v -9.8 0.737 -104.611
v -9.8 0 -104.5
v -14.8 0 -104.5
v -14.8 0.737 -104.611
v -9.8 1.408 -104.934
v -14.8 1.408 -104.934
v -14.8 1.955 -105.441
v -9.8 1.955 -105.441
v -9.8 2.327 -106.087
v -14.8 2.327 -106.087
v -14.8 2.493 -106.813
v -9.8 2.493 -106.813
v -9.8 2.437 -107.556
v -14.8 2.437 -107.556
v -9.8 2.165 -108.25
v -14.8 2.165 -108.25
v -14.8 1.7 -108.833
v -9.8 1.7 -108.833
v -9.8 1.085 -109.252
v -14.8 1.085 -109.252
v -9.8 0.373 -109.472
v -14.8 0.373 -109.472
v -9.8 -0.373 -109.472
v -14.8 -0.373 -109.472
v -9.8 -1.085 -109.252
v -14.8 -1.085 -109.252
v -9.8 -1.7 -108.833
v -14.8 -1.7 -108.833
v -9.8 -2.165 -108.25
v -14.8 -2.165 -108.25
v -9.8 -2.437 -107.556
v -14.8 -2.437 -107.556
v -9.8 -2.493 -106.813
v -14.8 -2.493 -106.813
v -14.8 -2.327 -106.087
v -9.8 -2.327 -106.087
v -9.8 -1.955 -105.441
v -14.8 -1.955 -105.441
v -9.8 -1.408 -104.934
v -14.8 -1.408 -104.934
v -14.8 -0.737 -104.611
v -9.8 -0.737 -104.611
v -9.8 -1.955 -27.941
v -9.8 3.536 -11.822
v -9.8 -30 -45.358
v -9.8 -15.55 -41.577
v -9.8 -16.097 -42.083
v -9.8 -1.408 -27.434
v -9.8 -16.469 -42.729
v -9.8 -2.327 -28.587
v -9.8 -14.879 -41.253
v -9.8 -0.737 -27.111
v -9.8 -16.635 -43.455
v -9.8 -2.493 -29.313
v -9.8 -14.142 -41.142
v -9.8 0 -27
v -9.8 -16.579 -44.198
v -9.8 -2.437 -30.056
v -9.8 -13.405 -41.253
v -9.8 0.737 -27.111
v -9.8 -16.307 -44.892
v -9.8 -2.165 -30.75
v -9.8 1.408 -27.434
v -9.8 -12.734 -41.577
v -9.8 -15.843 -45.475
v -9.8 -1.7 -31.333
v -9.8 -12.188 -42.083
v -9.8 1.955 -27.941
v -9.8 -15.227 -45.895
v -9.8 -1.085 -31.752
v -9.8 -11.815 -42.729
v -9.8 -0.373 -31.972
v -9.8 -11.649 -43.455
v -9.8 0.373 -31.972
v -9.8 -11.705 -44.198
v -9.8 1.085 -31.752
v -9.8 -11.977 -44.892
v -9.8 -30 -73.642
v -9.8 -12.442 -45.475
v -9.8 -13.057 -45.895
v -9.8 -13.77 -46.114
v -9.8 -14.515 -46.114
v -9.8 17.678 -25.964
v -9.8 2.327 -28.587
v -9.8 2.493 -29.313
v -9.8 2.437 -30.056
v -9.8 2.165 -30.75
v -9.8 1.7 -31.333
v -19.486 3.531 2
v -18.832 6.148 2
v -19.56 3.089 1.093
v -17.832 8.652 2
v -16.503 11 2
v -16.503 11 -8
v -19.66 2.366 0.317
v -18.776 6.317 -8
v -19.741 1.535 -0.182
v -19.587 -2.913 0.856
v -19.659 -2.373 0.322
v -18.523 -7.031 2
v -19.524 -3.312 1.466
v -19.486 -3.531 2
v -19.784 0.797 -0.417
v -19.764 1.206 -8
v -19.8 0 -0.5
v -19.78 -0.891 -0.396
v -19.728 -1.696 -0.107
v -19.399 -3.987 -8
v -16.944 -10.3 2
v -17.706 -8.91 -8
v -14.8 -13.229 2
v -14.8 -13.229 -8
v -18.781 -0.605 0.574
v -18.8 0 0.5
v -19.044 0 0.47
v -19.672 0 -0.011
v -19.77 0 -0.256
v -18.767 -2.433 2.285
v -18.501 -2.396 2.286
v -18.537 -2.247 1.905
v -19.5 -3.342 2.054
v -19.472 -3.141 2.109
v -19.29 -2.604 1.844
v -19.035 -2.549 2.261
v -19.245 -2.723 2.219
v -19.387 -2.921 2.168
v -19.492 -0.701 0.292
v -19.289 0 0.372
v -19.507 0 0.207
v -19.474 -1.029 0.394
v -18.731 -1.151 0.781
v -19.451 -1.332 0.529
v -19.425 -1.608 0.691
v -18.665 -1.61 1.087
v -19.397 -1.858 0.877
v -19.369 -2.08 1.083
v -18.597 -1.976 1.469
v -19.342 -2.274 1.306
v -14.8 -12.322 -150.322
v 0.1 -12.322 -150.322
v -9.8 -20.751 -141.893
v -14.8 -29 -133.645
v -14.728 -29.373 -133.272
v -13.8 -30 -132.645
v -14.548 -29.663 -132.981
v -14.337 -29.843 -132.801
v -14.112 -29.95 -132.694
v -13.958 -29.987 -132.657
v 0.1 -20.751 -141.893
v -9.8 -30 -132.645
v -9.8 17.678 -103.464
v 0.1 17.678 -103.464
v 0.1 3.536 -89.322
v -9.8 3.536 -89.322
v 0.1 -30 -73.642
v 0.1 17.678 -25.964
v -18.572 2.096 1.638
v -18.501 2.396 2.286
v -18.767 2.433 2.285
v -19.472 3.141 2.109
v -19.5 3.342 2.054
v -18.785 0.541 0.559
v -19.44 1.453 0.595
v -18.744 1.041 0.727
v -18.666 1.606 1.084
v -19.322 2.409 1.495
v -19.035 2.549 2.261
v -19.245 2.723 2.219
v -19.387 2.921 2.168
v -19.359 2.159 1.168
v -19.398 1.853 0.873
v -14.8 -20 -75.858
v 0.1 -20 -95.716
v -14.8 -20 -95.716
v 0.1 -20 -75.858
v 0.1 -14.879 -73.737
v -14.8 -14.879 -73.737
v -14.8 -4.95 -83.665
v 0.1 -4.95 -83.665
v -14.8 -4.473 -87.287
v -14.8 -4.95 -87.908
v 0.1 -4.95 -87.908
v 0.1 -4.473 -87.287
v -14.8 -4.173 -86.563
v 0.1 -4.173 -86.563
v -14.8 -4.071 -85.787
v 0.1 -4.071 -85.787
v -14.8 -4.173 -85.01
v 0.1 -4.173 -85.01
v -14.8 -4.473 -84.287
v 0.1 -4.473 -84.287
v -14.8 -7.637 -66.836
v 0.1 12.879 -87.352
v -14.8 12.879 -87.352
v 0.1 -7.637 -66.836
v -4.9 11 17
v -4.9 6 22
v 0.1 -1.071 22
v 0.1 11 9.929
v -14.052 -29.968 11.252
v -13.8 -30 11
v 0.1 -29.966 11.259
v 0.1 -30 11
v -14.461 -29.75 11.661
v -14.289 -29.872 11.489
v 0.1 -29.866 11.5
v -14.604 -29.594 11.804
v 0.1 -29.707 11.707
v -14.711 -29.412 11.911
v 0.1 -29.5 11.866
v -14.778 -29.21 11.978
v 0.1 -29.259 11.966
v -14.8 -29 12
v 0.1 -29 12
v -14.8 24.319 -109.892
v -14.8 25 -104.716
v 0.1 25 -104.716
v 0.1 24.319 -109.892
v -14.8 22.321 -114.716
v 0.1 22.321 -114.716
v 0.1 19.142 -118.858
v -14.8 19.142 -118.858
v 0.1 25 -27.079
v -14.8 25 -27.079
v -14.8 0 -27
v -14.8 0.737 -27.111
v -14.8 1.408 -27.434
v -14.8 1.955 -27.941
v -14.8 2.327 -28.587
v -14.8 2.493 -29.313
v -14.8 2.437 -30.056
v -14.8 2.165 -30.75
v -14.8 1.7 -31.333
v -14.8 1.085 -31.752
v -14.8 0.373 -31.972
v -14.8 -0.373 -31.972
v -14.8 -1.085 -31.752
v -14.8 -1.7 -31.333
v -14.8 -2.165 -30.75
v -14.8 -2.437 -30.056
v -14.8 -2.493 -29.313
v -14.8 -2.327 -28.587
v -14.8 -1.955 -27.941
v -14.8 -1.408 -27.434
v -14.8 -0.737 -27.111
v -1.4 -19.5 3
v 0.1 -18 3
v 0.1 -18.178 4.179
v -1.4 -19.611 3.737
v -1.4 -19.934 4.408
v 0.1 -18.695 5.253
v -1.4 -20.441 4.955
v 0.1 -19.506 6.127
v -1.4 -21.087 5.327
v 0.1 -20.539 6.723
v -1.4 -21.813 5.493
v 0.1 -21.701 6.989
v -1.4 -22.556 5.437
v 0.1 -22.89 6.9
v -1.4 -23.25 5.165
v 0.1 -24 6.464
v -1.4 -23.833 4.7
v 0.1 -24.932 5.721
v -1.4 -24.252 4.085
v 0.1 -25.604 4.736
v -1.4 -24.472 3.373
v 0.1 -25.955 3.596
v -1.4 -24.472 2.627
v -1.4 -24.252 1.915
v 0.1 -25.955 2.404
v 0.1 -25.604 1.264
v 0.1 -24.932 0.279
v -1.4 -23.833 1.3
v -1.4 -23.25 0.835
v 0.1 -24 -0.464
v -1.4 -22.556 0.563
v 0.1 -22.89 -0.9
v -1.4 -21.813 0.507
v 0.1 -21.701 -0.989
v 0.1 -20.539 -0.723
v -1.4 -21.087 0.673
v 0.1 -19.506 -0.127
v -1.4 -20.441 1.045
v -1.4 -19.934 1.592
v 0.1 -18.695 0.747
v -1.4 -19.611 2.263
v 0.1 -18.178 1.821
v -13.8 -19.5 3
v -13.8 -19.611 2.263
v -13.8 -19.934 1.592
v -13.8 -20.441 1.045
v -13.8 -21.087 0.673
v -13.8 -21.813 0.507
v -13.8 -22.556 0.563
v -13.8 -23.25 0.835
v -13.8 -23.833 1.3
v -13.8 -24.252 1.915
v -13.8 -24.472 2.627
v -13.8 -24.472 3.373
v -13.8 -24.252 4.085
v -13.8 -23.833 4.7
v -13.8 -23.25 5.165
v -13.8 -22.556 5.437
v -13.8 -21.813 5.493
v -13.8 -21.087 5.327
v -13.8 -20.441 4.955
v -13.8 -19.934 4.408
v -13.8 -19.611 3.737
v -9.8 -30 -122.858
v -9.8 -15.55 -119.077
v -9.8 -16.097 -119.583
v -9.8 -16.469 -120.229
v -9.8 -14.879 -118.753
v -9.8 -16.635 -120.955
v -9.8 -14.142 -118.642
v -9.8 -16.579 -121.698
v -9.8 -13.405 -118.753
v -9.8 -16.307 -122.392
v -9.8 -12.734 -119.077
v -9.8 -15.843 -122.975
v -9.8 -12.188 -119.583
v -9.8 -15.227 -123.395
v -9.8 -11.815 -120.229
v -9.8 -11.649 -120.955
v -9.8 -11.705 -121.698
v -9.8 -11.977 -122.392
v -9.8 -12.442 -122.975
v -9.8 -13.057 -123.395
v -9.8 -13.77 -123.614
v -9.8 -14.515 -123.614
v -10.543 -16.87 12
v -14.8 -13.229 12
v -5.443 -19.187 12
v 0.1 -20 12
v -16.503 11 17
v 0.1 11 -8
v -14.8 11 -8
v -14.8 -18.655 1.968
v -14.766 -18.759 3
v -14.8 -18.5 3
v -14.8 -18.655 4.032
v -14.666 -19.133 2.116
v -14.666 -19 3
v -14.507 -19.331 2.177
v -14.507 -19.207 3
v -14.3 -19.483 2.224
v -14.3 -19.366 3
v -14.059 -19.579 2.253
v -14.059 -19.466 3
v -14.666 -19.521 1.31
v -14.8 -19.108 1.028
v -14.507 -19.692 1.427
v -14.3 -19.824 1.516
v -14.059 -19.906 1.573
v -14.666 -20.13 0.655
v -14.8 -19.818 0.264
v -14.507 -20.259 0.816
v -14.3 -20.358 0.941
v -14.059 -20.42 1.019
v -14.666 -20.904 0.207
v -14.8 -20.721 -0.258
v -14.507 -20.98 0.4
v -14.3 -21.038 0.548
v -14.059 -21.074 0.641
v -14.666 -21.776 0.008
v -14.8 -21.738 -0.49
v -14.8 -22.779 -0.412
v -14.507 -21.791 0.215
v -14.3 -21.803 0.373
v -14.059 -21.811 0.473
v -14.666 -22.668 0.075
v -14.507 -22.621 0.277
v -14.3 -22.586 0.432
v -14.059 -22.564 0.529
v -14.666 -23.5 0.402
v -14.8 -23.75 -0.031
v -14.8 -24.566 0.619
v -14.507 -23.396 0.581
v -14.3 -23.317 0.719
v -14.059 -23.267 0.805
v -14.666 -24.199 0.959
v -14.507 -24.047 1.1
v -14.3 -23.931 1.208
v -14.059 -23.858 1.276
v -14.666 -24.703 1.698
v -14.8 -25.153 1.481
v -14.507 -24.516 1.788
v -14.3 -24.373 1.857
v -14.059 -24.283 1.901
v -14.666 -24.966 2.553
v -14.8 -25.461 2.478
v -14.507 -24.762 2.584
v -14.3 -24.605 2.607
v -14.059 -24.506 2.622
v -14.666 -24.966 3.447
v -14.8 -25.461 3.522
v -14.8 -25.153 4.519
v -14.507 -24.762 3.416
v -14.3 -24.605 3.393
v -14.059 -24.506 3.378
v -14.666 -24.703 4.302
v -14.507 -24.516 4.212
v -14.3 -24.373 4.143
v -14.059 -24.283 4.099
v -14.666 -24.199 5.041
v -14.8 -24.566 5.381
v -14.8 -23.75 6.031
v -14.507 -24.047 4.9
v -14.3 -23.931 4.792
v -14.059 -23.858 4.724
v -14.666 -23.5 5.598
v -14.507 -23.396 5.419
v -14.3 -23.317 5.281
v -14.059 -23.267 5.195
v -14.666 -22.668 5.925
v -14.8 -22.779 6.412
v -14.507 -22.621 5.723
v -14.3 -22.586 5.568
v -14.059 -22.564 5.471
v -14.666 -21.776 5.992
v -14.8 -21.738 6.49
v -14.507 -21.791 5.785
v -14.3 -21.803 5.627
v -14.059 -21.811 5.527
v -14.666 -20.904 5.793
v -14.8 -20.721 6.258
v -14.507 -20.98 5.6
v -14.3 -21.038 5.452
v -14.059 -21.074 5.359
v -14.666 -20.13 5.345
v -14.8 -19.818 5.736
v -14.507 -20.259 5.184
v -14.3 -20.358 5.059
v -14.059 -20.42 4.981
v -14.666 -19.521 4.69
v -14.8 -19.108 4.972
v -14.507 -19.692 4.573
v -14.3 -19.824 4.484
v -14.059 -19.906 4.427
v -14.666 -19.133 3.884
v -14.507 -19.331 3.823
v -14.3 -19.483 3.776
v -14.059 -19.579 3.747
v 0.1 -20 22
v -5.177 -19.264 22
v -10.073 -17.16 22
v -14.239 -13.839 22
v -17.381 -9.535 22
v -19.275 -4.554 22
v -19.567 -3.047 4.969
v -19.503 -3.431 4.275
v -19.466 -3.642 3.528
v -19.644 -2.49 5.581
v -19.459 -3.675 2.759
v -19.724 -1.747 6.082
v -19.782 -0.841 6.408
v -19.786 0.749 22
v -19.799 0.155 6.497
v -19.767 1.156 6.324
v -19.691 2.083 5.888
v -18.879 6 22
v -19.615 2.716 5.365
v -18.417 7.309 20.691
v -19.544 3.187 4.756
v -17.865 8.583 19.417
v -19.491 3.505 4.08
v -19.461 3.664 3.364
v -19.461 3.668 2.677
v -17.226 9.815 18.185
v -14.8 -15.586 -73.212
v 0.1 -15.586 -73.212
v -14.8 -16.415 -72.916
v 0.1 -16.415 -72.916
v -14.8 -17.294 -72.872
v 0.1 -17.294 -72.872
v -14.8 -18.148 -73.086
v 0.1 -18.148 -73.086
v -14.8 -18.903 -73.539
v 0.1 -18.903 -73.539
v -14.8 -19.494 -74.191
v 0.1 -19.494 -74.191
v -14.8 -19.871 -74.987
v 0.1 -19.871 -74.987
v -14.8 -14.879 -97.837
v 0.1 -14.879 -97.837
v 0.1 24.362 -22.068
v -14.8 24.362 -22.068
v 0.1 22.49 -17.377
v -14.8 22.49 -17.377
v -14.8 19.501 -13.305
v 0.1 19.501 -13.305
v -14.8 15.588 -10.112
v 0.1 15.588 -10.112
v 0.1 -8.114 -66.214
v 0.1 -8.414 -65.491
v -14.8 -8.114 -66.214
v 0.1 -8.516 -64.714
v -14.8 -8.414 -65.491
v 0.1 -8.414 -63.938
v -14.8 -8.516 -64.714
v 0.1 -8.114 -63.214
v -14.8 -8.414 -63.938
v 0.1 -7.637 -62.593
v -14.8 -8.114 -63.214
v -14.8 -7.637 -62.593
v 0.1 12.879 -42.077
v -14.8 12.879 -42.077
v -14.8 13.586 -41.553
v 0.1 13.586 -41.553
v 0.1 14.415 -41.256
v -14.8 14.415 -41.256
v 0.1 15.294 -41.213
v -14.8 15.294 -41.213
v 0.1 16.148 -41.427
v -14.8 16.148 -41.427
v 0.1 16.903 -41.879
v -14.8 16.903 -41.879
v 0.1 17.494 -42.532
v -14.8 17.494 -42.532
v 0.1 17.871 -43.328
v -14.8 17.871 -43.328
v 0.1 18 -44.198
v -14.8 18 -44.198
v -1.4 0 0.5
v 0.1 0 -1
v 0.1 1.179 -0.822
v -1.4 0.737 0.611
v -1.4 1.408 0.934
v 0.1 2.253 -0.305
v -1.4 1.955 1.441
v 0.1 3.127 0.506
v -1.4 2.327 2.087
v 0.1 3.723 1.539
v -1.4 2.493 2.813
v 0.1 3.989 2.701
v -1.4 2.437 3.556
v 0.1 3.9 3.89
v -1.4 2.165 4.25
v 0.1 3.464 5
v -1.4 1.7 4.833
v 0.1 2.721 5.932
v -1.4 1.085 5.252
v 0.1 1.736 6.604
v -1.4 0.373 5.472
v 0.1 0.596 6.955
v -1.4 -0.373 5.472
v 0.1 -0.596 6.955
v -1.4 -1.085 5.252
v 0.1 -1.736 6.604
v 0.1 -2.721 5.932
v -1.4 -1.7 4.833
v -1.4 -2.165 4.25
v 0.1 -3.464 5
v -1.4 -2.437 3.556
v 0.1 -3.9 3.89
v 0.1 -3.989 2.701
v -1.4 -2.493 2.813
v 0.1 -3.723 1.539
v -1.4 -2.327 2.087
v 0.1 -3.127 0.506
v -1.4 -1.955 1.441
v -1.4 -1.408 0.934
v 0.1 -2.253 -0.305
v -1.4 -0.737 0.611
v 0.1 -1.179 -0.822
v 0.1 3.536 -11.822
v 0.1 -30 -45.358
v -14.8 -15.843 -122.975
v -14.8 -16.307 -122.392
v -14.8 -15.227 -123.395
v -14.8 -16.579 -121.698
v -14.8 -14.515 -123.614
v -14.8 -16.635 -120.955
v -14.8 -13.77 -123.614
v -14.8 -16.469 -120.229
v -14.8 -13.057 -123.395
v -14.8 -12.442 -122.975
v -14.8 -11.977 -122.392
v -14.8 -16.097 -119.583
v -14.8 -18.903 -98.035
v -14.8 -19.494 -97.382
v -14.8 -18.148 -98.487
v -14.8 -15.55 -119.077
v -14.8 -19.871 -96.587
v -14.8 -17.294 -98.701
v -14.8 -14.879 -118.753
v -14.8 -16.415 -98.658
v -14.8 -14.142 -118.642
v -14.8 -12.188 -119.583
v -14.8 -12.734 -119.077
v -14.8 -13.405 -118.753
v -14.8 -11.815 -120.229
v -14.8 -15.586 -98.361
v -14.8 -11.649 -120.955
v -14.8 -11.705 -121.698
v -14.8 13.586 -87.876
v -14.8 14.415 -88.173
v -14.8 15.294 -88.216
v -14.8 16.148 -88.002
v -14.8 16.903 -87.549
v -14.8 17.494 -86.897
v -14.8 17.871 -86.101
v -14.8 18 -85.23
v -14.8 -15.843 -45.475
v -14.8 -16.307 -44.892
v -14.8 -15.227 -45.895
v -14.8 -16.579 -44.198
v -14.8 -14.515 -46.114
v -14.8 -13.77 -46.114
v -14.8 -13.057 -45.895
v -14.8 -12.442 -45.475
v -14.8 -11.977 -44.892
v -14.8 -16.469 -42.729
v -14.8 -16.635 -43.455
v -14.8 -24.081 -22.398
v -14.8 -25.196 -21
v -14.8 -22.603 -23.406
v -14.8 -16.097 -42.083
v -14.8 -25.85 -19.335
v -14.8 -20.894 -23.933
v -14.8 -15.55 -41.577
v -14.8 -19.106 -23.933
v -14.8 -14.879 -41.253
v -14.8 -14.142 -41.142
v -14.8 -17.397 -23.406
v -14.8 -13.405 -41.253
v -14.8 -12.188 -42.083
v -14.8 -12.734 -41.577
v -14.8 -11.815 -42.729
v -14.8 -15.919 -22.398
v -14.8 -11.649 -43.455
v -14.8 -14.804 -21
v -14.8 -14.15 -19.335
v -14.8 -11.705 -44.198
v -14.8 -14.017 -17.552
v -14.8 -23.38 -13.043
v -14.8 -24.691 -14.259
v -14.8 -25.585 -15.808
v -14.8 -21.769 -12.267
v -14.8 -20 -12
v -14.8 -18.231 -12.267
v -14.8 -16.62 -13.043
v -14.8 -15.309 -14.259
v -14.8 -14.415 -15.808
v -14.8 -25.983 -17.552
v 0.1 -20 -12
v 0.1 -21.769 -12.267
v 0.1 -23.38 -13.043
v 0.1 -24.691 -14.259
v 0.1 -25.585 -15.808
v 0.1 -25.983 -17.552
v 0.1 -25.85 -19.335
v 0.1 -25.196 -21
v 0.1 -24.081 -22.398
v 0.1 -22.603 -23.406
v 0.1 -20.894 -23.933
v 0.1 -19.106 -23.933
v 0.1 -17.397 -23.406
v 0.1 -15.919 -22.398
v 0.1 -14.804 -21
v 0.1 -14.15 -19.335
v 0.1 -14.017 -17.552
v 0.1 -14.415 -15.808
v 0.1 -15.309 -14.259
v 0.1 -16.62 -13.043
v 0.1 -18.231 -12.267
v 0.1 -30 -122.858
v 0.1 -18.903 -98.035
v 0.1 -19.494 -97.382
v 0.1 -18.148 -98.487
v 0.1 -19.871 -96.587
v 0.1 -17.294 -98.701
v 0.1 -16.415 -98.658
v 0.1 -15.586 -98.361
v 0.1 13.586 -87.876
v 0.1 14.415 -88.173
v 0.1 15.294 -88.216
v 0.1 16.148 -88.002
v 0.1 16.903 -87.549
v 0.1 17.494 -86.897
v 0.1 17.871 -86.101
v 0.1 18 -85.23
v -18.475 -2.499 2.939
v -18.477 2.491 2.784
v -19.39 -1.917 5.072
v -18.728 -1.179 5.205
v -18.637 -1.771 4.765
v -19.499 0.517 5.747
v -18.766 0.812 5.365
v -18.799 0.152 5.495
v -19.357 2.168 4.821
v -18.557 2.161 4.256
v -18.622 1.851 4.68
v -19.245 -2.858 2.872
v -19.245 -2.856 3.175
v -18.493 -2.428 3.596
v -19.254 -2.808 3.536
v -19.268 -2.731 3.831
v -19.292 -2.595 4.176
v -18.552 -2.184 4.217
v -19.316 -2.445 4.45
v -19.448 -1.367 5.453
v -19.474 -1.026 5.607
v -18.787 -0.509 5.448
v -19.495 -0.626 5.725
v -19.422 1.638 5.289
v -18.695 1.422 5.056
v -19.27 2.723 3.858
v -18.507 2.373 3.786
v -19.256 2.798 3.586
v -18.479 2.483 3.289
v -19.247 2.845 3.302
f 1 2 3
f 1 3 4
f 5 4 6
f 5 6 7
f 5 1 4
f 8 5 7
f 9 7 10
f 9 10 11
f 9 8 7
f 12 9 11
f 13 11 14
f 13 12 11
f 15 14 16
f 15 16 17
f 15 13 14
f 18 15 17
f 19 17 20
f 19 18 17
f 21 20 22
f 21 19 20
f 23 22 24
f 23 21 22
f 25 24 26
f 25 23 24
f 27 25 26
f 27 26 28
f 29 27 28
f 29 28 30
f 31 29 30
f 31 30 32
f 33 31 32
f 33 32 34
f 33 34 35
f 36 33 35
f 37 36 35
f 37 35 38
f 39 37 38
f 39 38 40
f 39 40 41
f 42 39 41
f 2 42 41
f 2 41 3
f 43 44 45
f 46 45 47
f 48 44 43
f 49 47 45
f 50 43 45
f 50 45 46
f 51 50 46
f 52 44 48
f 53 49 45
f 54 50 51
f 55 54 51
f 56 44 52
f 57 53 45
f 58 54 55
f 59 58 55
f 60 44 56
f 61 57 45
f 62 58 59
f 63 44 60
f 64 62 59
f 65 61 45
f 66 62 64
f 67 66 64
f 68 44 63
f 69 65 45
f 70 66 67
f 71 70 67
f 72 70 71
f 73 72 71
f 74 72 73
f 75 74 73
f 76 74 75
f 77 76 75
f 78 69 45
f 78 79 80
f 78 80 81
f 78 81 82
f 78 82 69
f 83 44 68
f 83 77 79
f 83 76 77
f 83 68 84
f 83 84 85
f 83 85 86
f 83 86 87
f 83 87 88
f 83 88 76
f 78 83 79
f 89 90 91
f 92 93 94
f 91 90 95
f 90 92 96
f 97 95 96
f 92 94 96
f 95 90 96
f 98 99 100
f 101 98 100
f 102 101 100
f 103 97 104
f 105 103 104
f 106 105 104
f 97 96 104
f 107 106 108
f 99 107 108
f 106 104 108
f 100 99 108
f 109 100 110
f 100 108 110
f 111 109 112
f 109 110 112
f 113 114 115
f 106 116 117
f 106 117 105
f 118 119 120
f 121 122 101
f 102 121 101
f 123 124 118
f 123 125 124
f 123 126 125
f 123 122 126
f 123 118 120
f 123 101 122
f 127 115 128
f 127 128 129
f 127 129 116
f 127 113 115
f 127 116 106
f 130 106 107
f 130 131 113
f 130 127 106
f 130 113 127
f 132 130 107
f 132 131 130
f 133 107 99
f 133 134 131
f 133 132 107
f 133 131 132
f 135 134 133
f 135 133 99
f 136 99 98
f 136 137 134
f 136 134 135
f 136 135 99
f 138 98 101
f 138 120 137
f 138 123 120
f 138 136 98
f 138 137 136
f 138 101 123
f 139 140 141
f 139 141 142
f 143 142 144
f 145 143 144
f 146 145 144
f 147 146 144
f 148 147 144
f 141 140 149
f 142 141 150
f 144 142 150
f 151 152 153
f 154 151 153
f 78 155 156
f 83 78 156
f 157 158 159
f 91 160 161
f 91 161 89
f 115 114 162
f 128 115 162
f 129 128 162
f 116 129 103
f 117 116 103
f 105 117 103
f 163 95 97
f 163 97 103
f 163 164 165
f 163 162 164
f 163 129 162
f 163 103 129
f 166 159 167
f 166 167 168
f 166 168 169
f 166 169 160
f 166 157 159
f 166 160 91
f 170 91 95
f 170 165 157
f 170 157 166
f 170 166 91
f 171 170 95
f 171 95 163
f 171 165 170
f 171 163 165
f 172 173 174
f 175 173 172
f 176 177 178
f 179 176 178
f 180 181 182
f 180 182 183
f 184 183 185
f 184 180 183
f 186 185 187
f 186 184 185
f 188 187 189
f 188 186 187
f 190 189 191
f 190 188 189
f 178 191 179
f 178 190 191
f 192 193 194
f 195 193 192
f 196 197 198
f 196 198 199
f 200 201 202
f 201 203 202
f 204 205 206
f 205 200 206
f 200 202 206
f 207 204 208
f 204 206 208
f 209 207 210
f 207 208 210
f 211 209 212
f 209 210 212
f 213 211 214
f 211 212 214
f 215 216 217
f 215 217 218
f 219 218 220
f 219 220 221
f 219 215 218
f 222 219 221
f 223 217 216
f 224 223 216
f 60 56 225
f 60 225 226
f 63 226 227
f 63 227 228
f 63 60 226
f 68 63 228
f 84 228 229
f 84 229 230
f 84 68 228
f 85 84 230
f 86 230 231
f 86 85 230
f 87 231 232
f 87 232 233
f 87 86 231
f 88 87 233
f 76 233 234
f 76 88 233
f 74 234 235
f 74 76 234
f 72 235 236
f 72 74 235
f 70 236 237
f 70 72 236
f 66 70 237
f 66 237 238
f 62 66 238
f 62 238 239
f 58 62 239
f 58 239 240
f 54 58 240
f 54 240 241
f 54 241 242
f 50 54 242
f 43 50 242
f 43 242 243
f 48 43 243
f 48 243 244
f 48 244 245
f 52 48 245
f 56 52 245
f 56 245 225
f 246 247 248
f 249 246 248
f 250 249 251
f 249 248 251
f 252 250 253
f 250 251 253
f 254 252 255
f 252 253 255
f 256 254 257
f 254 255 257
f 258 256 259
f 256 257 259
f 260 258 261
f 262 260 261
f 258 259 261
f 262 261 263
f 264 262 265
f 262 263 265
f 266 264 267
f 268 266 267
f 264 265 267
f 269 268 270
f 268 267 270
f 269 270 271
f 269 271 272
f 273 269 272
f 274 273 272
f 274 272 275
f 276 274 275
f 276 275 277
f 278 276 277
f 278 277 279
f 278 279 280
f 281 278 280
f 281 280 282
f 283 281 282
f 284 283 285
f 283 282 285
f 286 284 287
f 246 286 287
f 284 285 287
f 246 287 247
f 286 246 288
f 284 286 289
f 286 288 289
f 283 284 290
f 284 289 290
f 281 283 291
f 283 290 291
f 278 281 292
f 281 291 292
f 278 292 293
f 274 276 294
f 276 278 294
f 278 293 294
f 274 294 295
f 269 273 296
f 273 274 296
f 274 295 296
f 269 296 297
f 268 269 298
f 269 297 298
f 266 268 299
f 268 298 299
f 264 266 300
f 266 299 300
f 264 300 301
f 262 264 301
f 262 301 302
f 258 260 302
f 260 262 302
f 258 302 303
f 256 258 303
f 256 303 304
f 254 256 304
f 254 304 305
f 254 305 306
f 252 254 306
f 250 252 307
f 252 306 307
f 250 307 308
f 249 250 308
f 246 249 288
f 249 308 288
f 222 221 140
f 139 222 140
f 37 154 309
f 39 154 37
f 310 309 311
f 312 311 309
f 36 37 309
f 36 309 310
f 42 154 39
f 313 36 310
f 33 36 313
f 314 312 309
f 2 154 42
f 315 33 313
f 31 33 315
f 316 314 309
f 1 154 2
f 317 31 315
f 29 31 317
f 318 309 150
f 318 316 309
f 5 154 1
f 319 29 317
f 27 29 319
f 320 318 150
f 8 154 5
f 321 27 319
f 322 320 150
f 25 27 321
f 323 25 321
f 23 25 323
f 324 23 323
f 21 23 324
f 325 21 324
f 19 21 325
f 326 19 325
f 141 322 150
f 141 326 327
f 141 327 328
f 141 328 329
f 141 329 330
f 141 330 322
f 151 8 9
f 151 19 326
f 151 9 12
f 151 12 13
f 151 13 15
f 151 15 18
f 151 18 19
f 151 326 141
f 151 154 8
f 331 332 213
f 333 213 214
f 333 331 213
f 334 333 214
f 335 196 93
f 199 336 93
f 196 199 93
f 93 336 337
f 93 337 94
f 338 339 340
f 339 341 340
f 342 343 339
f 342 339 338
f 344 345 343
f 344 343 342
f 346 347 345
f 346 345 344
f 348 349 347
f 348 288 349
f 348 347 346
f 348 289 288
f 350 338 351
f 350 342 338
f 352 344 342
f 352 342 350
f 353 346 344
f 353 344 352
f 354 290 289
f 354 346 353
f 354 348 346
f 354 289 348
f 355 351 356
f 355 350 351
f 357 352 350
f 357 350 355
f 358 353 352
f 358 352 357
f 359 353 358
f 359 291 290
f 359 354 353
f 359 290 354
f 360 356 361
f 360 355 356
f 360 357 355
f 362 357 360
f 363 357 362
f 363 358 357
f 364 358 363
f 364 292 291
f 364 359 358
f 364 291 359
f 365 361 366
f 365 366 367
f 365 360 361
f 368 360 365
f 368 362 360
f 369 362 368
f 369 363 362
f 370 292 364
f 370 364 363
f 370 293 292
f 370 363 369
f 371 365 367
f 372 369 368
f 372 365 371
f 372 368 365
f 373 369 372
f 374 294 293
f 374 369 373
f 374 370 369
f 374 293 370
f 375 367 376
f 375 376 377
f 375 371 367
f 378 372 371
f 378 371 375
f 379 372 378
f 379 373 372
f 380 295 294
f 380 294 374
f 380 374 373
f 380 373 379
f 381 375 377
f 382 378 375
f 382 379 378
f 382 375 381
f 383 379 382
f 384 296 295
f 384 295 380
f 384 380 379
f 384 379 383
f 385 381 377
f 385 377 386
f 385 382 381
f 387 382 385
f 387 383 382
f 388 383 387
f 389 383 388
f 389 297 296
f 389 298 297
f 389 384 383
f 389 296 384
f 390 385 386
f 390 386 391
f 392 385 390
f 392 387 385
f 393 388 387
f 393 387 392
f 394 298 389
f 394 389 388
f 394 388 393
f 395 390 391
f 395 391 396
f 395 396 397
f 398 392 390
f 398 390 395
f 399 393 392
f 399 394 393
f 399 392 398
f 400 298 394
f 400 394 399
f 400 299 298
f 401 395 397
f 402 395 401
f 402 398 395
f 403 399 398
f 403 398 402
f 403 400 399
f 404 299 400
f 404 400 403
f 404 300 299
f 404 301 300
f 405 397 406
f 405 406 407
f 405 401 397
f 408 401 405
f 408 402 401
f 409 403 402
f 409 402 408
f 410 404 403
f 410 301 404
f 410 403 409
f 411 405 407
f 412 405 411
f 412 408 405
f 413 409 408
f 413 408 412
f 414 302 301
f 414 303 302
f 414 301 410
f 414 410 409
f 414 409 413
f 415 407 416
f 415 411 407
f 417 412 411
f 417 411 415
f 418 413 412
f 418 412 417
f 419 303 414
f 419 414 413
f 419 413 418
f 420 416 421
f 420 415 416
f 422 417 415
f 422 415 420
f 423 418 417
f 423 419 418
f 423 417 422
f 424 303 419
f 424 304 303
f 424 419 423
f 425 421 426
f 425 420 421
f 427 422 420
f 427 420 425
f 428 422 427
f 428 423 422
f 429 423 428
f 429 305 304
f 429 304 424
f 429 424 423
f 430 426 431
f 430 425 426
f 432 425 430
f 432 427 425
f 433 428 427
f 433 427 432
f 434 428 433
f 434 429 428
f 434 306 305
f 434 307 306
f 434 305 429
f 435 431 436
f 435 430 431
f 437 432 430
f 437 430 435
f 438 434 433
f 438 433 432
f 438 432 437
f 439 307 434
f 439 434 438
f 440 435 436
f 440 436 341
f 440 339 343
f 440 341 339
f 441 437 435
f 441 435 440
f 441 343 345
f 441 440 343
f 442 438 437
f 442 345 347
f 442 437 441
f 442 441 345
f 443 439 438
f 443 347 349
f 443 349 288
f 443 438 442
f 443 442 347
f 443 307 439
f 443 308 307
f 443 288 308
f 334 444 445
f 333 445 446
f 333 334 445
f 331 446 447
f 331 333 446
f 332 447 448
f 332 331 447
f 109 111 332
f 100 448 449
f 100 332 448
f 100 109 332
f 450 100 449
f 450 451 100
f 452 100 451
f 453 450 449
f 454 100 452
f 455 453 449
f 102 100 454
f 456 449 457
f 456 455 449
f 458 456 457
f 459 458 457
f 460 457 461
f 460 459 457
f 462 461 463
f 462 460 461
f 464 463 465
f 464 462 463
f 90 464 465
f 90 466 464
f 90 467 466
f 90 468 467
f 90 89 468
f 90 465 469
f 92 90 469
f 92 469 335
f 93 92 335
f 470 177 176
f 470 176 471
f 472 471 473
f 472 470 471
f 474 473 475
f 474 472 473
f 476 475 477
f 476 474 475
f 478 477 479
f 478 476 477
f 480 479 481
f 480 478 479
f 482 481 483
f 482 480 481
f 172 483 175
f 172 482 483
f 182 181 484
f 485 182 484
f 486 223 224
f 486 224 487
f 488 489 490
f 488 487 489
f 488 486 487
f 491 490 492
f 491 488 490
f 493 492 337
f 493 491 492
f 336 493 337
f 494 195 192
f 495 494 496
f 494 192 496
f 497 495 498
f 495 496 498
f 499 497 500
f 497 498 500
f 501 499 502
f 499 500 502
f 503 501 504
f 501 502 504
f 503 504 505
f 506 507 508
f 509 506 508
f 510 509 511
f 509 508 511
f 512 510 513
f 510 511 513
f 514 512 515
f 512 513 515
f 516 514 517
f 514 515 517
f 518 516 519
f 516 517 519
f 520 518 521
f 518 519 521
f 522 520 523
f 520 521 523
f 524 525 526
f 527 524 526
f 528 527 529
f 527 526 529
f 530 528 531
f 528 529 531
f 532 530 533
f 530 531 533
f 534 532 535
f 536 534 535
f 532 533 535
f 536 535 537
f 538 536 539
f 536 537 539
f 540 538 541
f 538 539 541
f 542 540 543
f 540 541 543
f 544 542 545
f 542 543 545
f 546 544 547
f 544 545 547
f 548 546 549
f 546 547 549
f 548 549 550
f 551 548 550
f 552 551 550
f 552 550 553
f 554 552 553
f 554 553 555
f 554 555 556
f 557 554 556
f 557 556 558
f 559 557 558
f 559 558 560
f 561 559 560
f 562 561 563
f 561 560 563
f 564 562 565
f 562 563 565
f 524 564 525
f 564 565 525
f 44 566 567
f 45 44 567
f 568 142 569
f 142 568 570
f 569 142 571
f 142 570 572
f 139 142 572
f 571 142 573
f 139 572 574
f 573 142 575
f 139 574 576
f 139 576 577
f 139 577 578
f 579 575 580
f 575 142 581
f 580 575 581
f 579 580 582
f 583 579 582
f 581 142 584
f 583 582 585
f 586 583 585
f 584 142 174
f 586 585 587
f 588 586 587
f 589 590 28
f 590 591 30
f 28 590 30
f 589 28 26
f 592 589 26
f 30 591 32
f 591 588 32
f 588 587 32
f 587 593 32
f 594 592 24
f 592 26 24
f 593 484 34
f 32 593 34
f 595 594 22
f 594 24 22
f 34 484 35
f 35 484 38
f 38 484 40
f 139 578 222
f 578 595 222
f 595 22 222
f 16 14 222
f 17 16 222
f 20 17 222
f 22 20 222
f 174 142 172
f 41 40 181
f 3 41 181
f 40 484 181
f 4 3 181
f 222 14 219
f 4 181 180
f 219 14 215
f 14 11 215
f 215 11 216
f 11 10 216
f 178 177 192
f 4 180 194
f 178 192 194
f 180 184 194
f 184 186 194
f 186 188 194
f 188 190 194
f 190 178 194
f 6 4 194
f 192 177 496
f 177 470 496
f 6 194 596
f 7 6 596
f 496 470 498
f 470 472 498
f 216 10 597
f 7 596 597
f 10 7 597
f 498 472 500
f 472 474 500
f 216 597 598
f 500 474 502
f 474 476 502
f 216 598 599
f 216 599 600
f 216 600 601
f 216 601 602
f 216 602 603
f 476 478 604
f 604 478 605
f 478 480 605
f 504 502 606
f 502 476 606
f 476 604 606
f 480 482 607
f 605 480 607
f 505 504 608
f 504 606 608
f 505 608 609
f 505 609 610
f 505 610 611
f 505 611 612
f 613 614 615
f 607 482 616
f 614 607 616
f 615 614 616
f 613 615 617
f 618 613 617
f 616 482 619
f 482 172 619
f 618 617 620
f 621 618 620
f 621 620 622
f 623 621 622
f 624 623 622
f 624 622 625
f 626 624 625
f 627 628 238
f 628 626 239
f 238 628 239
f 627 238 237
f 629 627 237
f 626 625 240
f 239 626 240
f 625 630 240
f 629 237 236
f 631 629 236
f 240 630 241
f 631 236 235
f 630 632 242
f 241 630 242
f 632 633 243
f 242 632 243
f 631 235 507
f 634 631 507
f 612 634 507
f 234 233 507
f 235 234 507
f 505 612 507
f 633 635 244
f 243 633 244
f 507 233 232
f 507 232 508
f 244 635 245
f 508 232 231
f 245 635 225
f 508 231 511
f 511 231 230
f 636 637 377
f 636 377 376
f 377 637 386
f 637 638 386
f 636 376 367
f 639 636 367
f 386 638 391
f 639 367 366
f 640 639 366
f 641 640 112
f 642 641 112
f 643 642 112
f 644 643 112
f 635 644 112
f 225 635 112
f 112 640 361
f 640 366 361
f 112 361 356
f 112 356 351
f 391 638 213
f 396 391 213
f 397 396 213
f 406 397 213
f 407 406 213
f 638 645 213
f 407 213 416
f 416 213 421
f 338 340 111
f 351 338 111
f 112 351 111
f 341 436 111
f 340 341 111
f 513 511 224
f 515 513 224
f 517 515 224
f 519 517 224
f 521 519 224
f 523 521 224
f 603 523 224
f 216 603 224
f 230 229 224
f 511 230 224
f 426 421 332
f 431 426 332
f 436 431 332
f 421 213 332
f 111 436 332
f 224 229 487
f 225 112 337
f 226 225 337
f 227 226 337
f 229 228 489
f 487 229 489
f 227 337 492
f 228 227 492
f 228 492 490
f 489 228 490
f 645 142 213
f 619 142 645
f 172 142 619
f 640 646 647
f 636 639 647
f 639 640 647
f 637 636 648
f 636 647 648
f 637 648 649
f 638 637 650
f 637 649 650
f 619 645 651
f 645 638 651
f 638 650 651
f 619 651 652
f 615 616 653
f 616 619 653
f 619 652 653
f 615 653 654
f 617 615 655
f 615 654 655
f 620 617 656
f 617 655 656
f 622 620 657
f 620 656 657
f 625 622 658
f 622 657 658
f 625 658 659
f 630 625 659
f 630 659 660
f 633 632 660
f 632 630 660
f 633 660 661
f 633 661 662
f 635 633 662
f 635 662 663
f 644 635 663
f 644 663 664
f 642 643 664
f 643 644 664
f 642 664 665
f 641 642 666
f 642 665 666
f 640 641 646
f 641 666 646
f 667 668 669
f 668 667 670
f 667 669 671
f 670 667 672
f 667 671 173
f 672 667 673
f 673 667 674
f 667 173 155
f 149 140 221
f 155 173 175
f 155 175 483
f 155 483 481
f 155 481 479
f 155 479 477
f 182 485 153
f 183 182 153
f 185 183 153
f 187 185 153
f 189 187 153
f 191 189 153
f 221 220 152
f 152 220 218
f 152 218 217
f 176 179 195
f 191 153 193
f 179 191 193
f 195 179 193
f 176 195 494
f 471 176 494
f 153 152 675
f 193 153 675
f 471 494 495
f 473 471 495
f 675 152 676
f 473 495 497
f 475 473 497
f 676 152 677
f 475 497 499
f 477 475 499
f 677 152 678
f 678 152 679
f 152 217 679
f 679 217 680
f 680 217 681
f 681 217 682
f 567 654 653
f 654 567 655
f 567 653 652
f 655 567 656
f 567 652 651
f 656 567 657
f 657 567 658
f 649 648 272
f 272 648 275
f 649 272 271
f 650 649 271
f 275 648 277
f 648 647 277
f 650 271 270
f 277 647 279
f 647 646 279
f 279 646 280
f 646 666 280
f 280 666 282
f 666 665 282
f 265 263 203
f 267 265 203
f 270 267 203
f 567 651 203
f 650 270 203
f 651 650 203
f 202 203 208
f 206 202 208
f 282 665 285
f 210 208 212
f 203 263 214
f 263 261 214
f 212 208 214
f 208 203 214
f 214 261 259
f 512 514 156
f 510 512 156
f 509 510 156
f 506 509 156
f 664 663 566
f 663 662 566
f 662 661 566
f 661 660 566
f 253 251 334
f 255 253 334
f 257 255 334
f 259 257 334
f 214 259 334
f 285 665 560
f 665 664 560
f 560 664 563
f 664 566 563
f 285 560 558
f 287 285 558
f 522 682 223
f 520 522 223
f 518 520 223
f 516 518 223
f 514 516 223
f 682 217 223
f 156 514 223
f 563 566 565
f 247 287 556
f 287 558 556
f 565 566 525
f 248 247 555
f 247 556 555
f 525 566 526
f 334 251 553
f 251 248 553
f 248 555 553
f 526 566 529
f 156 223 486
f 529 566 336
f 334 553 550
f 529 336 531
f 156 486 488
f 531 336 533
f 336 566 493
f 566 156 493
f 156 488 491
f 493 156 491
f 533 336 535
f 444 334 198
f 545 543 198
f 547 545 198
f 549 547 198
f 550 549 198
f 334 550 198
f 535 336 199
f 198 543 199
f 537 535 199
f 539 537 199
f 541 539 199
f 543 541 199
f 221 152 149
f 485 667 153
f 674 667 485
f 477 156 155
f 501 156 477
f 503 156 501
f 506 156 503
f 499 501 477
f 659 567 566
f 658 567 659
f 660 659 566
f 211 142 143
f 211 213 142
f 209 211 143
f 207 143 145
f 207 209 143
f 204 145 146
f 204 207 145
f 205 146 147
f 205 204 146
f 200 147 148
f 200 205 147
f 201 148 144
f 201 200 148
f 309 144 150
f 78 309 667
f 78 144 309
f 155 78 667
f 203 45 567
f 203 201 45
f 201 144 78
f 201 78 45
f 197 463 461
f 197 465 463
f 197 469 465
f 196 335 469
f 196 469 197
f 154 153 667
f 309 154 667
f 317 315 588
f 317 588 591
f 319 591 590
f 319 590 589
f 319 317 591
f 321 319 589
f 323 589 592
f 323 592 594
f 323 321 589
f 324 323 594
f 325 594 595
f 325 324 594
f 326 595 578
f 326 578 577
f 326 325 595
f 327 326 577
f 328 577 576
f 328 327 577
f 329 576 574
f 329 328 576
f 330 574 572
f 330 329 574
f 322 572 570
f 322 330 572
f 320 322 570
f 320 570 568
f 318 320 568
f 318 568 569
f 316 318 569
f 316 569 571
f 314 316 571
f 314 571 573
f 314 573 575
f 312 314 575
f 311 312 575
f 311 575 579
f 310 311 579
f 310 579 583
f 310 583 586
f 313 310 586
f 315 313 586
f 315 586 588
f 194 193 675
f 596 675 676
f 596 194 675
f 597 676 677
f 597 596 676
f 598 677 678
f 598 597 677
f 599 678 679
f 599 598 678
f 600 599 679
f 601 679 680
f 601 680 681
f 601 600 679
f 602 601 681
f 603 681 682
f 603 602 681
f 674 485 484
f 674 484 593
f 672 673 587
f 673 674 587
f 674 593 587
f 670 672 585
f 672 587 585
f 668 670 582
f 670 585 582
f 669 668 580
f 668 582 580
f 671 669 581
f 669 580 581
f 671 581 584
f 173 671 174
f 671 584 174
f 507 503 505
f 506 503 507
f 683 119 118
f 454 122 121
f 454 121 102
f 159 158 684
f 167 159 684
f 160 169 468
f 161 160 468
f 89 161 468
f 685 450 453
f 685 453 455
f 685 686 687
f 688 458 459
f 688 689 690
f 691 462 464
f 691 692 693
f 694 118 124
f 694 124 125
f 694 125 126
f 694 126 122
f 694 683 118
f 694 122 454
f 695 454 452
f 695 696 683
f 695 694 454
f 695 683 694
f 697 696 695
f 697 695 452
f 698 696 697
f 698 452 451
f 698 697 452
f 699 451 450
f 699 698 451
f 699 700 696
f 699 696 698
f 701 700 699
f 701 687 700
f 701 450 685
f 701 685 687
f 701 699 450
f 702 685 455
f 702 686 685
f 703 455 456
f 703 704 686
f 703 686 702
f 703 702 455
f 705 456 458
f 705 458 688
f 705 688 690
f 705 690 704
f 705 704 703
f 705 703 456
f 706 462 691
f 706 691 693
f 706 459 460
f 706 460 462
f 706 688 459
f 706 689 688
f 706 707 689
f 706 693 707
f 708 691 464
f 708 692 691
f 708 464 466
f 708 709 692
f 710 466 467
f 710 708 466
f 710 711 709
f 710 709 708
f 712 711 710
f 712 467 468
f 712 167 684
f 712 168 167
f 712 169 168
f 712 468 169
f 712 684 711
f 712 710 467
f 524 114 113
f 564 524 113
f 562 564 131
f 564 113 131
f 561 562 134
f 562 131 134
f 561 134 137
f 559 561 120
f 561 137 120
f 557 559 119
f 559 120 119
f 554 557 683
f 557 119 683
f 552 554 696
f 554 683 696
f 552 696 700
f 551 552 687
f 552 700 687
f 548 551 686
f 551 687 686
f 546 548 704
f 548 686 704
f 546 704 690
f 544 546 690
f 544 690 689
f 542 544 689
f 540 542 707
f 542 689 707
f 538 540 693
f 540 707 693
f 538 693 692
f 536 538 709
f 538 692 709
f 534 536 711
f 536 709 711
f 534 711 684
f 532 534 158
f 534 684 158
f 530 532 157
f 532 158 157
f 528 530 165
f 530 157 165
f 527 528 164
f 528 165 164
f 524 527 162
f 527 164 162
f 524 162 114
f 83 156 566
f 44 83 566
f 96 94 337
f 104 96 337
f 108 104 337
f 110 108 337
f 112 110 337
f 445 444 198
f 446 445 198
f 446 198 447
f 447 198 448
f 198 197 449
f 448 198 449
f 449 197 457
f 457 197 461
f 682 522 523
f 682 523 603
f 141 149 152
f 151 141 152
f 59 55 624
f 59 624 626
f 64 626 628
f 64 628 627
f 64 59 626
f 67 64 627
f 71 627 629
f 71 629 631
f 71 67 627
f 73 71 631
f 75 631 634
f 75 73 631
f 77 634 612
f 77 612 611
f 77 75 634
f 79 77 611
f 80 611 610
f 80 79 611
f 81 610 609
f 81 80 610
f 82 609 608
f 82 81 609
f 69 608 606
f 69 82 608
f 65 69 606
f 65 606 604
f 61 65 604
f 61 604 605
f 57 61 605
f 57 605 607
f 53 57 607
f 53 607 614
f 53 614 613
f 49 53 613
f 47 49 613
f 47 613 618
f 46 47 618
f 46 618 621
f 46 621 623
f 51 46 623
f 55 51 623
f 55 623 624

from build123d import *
from build123d.topology import SkipClean

# Parameters (mm, degrees)
EXTRUDE_1_DEPTH            = 21
SKETCH_2_W                 = 20
SKETCH_2_H                 = 20
CUT_EXTRUDE_1_DEPTH        = 10
SKETCH_3_R                 = 25
EXTRUDE_2_DEPTH            = 2
SKETCH_4_W                 = 20
SKETCH_4_H                 = 20
CUT_EXTRUDE_2_DEPTH        = 20
SKETCH_5_W                 = 67.669648092
SKETCH_5_H                 = 52.455829112
CUT_EXTRUDE_3_DEPTH        = 22
EXTRUDE_5_DEPTH            = 1
CUT_EXTRUDE_START          = -6
CUT_EXTRUDE_12_DEPTH       = 6
CUT_EXTRUDE_13_DEPTH       = 2
SKETCH_21_W                = 20
SKETCH_21_H                = 20
EXTRUDE_7_DEPTH            = 19
SKETCH_22_W                = 30
SKETCH_22_H                = 20
EXTRUDE_8_DEPTH            = 10
EXTRUDE_START              = 10
EXTRUDE_9_DEPTH            = 10
SKETCH_24_W                = 30
SKETCH_24_H                = 50
EXTRUDE_10_DEPTH           = 160
SKETCH_26_R                = 2.5
CUT_EXTRUDE_15_DEPTH       = 50
CUT_EXTRUDE_1_2_DEPTH      = 10
CUT_EXTRUDE_1_2_DEPTH_BACK = 10
SKETCH_28_W                = 30
SKETCH_28_H                = 160
EXTRUDE_11_DEPTH           = 5
CUT_EXTRUDE_16_DEPTH       = 25
CUT_EXTRUDE_16_DEPTH_BACK  = 60
SKETCH_29_R                = 2.5
CUT_EXTRUDE_17_DEPTH       = 60
CUT_EXTRUDE_18_DEPTH       = 60
CUT_EXTRUDE_18_DEPTH_BACK  = 60
CUT_EXTRUDE_19_DEPTH       = 60
CUT_EXTRUDE_19_DEPTH_BACK  = 60
FILLET_4_R                 = 3
CUT_EXTRUDE_20_DEPTH       = 60
CUT_EXTRUDE_20_DEPTH_BACK  = 60
SKETCH_33_R                = 6
CUT_EXTRUDE_21_DEPTH       = 60
FILLET_5_R                 = 20
SKETCH_35_R                = 2.5
CUT_EXTRUDE_22_DEPTH       = 60
FILLET_6_R                 = 20
SKETCH_36_W                = 257.466692503
SKETCH_36_H                = 187.225779306
CUT_EXTRUDE_23_DEPTH       = 82
CUT_EXTRUDE_24_DEPTH       = 0.1
CHAMFER_1_SIZE             = 1.5
FILLET_7_R                 = 1
FILLET_8_R                 = 1
CHAMFER_2_SIZE             = 5
CHAMFER_3_SIZE             = 5


with BuildPart() as part:
    # 草图1 → 凸台-拉伸1 (new body)
    with BuildSketch(Plane.XY):
        with BuildLine():
            Line((16.703293088, 11), (-16.703293088, 11))
            ThreePointArc((-16.703293088, 11), (0, -20), (16.703293088, 11))
        make_face()
    extrude(amount=EXTRUDE_1_DEPTH)

    # 草图2 → Cut-Extrude 1 (cut)
    with BuildSketch(Plane.XY.offset(21)):
        Rectangle(SKETCH_2_W, SKETCH_2_H)
    extrude(amount=-CUT_EXTRUDE_1_DEPTH, mode=Mode.SUBTRACT)

    # 草图3 → 凸台-拉伸2 (add)
    with BuildSketch(Plane(origin=(0, 0, 0), x_dir=(-1, 0, 0), z_dir=(0, 0, -1))):
        Circle(SKETCH_3_R)
        with BuildLine():
            Line((16.703293088, 11), (-16.703293088, 11))
            ThreePointArc((-16.703293088, 11), (0, -20), (16.703293088, 11))
        make_face(mode=Mode.SUBTRACT)
    extrude(amount=-EXTRUDE_2_DEPTH)

    # 草图4 → 切除-拉伸2 (cut)
    with BuildSketch(Plane.XY.offset(11)):
        Rectangle(SKETCH_4_W, SKETCH_4_H)
    extrude(amount=-CUT_EXTRUDE_2_DEPTH, mode=Mode.SUBTRACT)

    # 草图5 → 切除-拉伸3 (cut)
    with BuildSketch(Plane(origin=(0, 11, 0), x_dir=(1, 0, 0), z_dir=(0, 1, 0))):
        Rectangle(SKETCH_5_W, SKETCH_5_H)
    extrude(amount=CUT_EXTRUDE_3_DEPTH, mode=Mode.SUBTRACT)

    # 草图10 → 凸台-拉伸5 (add)
    with BuildSketch(Plane.XY.offset(21)):
        with BuildLine():
            Line((16.703293088, 11), (-16.703293088, 11))
            ThreePointArc((-16.703293088, 11), (0, -20), (16.703293088, 11))
        make_face()
    extrude(amount=EXTRUDE_5_DEPTH)

    # 草图18 → 切除-拉伸12 (cut)
    with SkipClean():  # the faces are left unmerged after this step: merging them gives an invalid solid
        with BuildSketch(Plane.XY.offset(2).offset(CUT_EXTRUDE_START)):
            with BuildLine():
                Line((-16.703293088, 11), (-22.449944321, 11))
                ThreePointArc((-22.449944321, 11), (0, -25), (22.449944321, 11))
                Line((22.449944321, 11), (16.703293088, 11))
                ThreePointArc((16.703293088, 11), (0, -20), (-16.703293088, 11))
            make_face()
        extrude(amount=CUT_EXTRUDE_12_DEPTH, mode=Mode.SUBTRACT)

    # 草图19 → 切除-拉伸13 (cut)
    with BuildSketch(Plane(origin=(0, 0, 0), x_dir=(-1, 0, 0), z_dir=(0, 0, -1))):
        with BuildLine():
            Line((16.703293088, 11), (-16.703293088, 11))
            ThreePointArc((-16.703293088, 11), (0, -20), (16.703293088, 11))
        make_face()
    extrude(amount=-CUT_EXTRUDE_13_DEPTH, mode=Mode.SUBTRACT)

    # 草图21 → 凸台-拉伸7 (add)
    with BuildSketch(Plane(origin=(0, 0, 21), x_dir=(-1, 0, 0), z_dir=(0, 0, -1))):
        Rectangle(SKETCH_21_W, SKETCH_21_H)
    extrude(amount=EXTRUDE_7_DEPTH)

    # 草图22 → 凸台-拉伸8 (add)
    with BuildSketch(Plane(origin=(0, 0, 2), x_dir=(-1, 0, 0), z_dir=(0, 0, -1))):
        with Locations((0, -20)):
            Rectangle(SKETCH_22_W, SKETCH_22_H)
    extrude(amount=-EXTRUDE_8_DEPTH)

    # 草图23 → 凸台-拉伸9 (add)
    with SkipClean():  # the faces are left unmerged after this step: merging them gives an invalid solid
        with BuildSketch(Plane(origin=(0, 0, 2), x_dir=(-1, 0, 0), z_dir=(0, 0, -1)).offset(EXTRUDE_START)):
            with BuildLine():
                Line((-15, -13.228756555), (-15, -30))
                Line((-15, -30), (15, -30))
                Line((15, -30), (15, -13.228756555))
                ThreePointArc((15, -13.228756555), (19.950760868, -1.402547961), (16.703293088, 11))
                Line((16.703293088, 11), (-16.703293088, 11))
                ThreePointArc((-16.703293088, 11), (-19.950760868, -1.402547961), (-15, -13.228756555))
            make_face()
        extrude(amount=-EXTRUDE_9_DEPTH)

    # 草图24 → 凸台-拉伸10 (add)
    with SkipClean():  # the faces are left unmerged after this step: merging them gives an invalid solid
        with BuildSketch(Plane(origin=(0, 0, -8), x_dir=(-1, 0, 0), z_dir=(0, 0, -1))):
            with Locations((0, -5)):
                Rectangle(SKETCH_24_W, SKETCH_24_H)
        extrude(amount=EXTRUDE_10_DEPTH)

    # 草图26 → 切除-拉伸15 (cut)
    with SkipClean():  # the faces are left unmerged after this step: merging them gives an invalid solid
        with BuildSketch(Plane.ZY.offset(15)):
            with Locations((-107, 0)):
                Circle(SKETCH_26_R)
            with Locations((-29.5, 0)):
                Circle(SKETCH_26_R)
        extrude(amount=-CUT_EXTRUDE_15_DEPTH, mode=Mode.SUBTRACT)

    # 草图27 → Cut-Extrude 1 2 (cut, two sides: drawn at the far end of the back side and taken through both)
    with SkipClean():  # the faces are left unmerged after this step: merging them gives an invalid solid
        with BuildSketch(Plane(origin=(0, 0, 0), x_dir=(0, 0, -1), z_dir=(1, 0, 0)).offset(-CUT_EXTRUDE_1_2_DEPTH_BACK)):
            Polygon((89.32233047, 3.535533906), (138.819805153, -45.961940777), (152.961940777, -31.819805153), (103.464466094, 17.67766953), align=None)
            Polygon((11.82233047, 3.535533906), (61.319805153, -45.961940777), (75.461940777, -31.819805153), (25.964466094, 17.67766953), align=None)
        extrude(amount=CUT_EXTRUDE_1_2_DEPTH + CUT_EXTRUDE_1_2_DEPTH_BACK, mode=Mode.SUBTRACT)

    # 草图28 → 凸台-拉伸11 (add)
    with SkipClean():  # the faces are left unmerged after this step: merging them gives an invalid solid
        with BuildSketch(Plane(origin=(0, 20, 0), x_dir=(1, 0, 0), z_dir=(0, 1, 0))):
            with Locations((0, 88)):
                Rectangle(SKETCH_28_W, SKETCH_28_H)
        extrude(amount=EXTRUDE_11_DEPTH)

    # 草图29 → 切除-拉伸16 (cut, two sides: drawn at the far end of the back side and taken through both)
    with SkipClean():  # the faces are left unmerged after this step: merging them gives an invalid solid
        with BuildSketch(Plane.ZY.offset(15).offset(-CUT_EXTRUDE_16_DEPTH_BACK)):
            with Locations(Location((3, 0, 0), (0, 0, 180))):
                Circle(SKETCH_29_R)
            with Locations(Location((3, -22, 0), (0, 0, 90))):
                Circle(SKETCH_29_R)
        extrude(amount=CUT_EXTRUDE_16_DEPTH + CUT_EXTRUDE_16_DEPTH_BACK, mode=Mode.SUBTRACT)

    # 草图30 → 切除-拉伸17 (cut)
    with SkipClean():  # the faces are left unmerged after this step: merging them gives an invalid solid
        with BuildSketch(Plane.ZY.offset(15)):
            Polygon((-113, 25), (-168, -30), (-168, 25), align=None)
        extrude(amount=-CUT_EXTRUDE_17_DEPTH, mode=Mode.SUBTRACT)

    # 草图31 → 切除-拉伸18 (cut, two sides: drawn at the far end of the back side and taken through both)
    with SkipClean():  # the faces are left unmerged after this step: merging them gives an invalid solid
        with BuildSketch(Plane(origin=(0, 0, 0), x_dir=(0, 0, -1), z_dir=(1, 0, 0)).offset(-CUT_EXTRUDE_18_DEPTH_BACK)):
            Polygon((92.473088065, 18), (64.714466094, -9.758621971), (36.955844123, 18), align=None)
        extrude(amount=CUT_EXTRUDE_18_DEPTH + CUT_EXTRUDE_18_DEPTH_BACK, mode=Mode.SUBTRACT)

    # 草图32 → 切除-拉伸19 (cut, two sides: drawn at the far end of the back side and taken through both)
    with SkipClean():  # the faces are left unmerged after this step: merging them gives an invalid solid
        with BuildSketch(Plane(origin=(0, 0, 0), x_dir=(0, 0, -1), z_dir=(1, 0, 0)).offset(-CUT_EXTRUDE_19_DEPTH_BACK)):
            Polygon((85.786796564, -2.828427125), (102.95836944, -20), (68.615223689, -20), align=None)
        extrude(amount=CUT_EXTRUDE_19_DEPTH + CUT_EXTRUDE_19_DEPTH_BACK, mode=Mode.SUBTRACT)

    # 圆角4
    fillet_4_edges = [part.edges().sort_by_distance(p)[0] for p in [
        (0, 18, -92.473088065),
        (0, 18, -36.955844123),
        (0, -9.758621971, -64.714466094),
        (0, -2.828427125, -85.786796564),
        (0, -20, -68.615223689),
        (0, -20, -102.95836944),
    ]]
    fillet(fillet_4_edges, radius=FILLET_4_R)

    # 草图33 → 切除-拉伸20 (cut, two sides: drawn at the far end of the back side and taken through both)
    with BuildSketch(Plane(origin=(0, 0, 0), x_dir=(0, 0, -1), z_dir=(1, 0, 0)).offset(-CUT_EXTRUDE_20_DEPTH_BACK)):
        with Locations(Location((18, -20, 0), (0, 0, 180))):
            Circle(SKETCH_33_R)
    extrude(amount=CUT_EXTRUDE_20_DEPTH + CUT_EXTRUDE_20_DEPTH_BACK, mode=Mode.SUBTRACT)

    # 草图34 → 切除-拉伸21 (cut)
    with BuildSketch(Plane.ZY.offset(15)):
        Polygon((-150.32233047, -12.32233047), (-132.644660941, -30), (-168, -30), align=None)
    extrude(amount=-CUT_EXTRUDE_21_DEPTH, mode=Mode.SUBTRACT)

    # 圆角5
    fillet_5_edges = [part.edges().sort_by_distance(p)[0] for p in [
        (0, 25, -113),
    ]]
    fillet(fillet_5_edges, radius=FILLET_5_R)

    # 草图35 → 切除-拉伸22 (cut)
    with BuildSketch(Plane.ZY.offset(15)):
        with Locations((-29.5, 0)):
            Circle(SKETCH_35_R)
        with Locations((-107, 0)):
            Circle(SKETCH_35_R)
        with Locations((-121.142135624, -14.142135624)):
            Circle(SKETCH_35_R)
        with Locations((-43.642135624, -14.142135624)):
            Circle(SKETCH_35_R)
    extrude(amount=-CUT_EXTRUDE_22_DEPTH, mode=Mode.SUBTRACT)

    # 圆角6
    # the kernel refuses this fillet: 20 mm, written as the material it takes off along each edge
    with BuildSketch(Plane(origin=(-62.696960071, 25, -8), x_dir=(0, 0, -1), z_dir=(1, 0, 0))) as fillet_6_piece_1:
        with BuildLine():
            CenterArc((19.078784028, -20), FILLET_6_R, 90, 72.542396876)
            Line((0, -14), (-0.381575681, -13.88))
            ThreePointArc((-0.381575681, -13.88), (-0.4, -7), (-0.4, 0))
            Line((-0.4, 0), (0, 0.4))
            Line((0, 0.4), (19.078784028, 0.4))
            Line((19.078784028, 0.4), (19.078784028, 0))
        make_face()
    extrude(amount=125.393920142, mode=Mode.SUBTRACT)

    # 草图36 → 切除-拉伸23 (cut)
    with BuildSketch(Plane(origin=(0, 0, 0), x_dir=(0, 0, -1), z_dir=(1, 0, 0))):
        with Locations((64.036181404, -32.621103346)):
            Rectangle(SKETCH_36_W, SKETCH_36_H)
    extrude(amount=-CUT_EXTRUDE_23_DEPTH, mode=Mode.SUBTRACT)

    # 草图37 → 切除-拉伸24 (cut)
    with BuildSketch(Plane.ZY):
        with BuildLine():
            Line((-11.82233047, 3.535533906), (-45.357864376, -30))
            Line((-45.357864376, -30), (12, -30))
            Line((12, -30), (12, -20))
            Line((12, -20), (22, -20))
            Line((22, -20), (22, 11))
            Line((22, 11), (-8, 11))
            ThreePointArc((-8, 11), (-15.246624462, 21.124515497), (-27.078784028, 25))
            Line((-27.078784028, 25), (-104.715728753, 25))
            ThreePointArc((-104.715728753, 25), (-112.3693974, 23.47759065), (-118.857864376, 19.142135624))
            Line((-118.857864376, 19.142135624), (-150.32233047, -12.32233047))
            Line((-150.32233047, -12.32233047), (-141.893398282, -20.751262658))
            Line((-141.893398282, -20.751262658), (-103.464466094, 17.67766953))
            Line((-103.464466094, 17.67766953), (-89.32233047, 3.535533906))
            Line((-89.32233047, 3.535533906), (-122.857864376, -30))
            Line((-122.857864376, -30), (-73.642135624, -30))
            Line((-73.642135624, -30), (-25.964466094, 17.67766953))
            Line((-25.964466094, 17.67766953), (-11.82233047, 3.535533906))
        make_face()
    extrude(amount=-CUT_EXTRUDE_24_DEPTH, mode=Mode.SUBTRACT)


with BuildPart() as body_2:
    # 镜向1: mirrored copy
    add(part.part.mirror(Plane(origin=(0.1, 5, -27.078784028), x_dir=(0, 0, 1), z_dir=(-1, 0, 0))))

    # 倒角1
    chamfer_1_edges = [body_2.edges().sort_by_distance(p)[0] for p in [
        (0.1, 0, 5.5),
        (0.1, -24.5, 3),
    ]]
    chamfer(chamfer_1_edges, length=CHAMFER_1_SIZE)

    # 圆角7
    fillet_7_edges = [body_2.edges().sort_by_distance(p)[0] for p in [
        (-19.8, 0, 5.5),
        (-14.8, -24.5, 3),
    ]]
    fillet(fillet_7_edges, radius=FILLET_7_R)

    # 圆角8
    fillet_8_edges = [body_2.edges().sort_by_distance(p)[0] for p in [
        (-14.8, -30, -60.32233047),
        (-7.35, -30, 12),
    ]]
    fillet(fillet_8_edges, radius=FILLET_8_R)

    # 倒角2
    chamfer_2_edges = [body_2.edges().sort_by_distance(p)[0] for p in [
        (-8.201646544, 11, 22),
    ]]
    chamfer(chamfer_2_edges, length=CHAMFER_2_SIZE)

    # 倒角3
    chamfer_3_edges = [body_2.edges().sort_by_distance(p)[0] for p in [
        (0.1, 8.5, 19.5),
    ]]
    chamfer(chamfer_3_edges, length=CHAMFER_3_SIZE)


solid = body_2.part
